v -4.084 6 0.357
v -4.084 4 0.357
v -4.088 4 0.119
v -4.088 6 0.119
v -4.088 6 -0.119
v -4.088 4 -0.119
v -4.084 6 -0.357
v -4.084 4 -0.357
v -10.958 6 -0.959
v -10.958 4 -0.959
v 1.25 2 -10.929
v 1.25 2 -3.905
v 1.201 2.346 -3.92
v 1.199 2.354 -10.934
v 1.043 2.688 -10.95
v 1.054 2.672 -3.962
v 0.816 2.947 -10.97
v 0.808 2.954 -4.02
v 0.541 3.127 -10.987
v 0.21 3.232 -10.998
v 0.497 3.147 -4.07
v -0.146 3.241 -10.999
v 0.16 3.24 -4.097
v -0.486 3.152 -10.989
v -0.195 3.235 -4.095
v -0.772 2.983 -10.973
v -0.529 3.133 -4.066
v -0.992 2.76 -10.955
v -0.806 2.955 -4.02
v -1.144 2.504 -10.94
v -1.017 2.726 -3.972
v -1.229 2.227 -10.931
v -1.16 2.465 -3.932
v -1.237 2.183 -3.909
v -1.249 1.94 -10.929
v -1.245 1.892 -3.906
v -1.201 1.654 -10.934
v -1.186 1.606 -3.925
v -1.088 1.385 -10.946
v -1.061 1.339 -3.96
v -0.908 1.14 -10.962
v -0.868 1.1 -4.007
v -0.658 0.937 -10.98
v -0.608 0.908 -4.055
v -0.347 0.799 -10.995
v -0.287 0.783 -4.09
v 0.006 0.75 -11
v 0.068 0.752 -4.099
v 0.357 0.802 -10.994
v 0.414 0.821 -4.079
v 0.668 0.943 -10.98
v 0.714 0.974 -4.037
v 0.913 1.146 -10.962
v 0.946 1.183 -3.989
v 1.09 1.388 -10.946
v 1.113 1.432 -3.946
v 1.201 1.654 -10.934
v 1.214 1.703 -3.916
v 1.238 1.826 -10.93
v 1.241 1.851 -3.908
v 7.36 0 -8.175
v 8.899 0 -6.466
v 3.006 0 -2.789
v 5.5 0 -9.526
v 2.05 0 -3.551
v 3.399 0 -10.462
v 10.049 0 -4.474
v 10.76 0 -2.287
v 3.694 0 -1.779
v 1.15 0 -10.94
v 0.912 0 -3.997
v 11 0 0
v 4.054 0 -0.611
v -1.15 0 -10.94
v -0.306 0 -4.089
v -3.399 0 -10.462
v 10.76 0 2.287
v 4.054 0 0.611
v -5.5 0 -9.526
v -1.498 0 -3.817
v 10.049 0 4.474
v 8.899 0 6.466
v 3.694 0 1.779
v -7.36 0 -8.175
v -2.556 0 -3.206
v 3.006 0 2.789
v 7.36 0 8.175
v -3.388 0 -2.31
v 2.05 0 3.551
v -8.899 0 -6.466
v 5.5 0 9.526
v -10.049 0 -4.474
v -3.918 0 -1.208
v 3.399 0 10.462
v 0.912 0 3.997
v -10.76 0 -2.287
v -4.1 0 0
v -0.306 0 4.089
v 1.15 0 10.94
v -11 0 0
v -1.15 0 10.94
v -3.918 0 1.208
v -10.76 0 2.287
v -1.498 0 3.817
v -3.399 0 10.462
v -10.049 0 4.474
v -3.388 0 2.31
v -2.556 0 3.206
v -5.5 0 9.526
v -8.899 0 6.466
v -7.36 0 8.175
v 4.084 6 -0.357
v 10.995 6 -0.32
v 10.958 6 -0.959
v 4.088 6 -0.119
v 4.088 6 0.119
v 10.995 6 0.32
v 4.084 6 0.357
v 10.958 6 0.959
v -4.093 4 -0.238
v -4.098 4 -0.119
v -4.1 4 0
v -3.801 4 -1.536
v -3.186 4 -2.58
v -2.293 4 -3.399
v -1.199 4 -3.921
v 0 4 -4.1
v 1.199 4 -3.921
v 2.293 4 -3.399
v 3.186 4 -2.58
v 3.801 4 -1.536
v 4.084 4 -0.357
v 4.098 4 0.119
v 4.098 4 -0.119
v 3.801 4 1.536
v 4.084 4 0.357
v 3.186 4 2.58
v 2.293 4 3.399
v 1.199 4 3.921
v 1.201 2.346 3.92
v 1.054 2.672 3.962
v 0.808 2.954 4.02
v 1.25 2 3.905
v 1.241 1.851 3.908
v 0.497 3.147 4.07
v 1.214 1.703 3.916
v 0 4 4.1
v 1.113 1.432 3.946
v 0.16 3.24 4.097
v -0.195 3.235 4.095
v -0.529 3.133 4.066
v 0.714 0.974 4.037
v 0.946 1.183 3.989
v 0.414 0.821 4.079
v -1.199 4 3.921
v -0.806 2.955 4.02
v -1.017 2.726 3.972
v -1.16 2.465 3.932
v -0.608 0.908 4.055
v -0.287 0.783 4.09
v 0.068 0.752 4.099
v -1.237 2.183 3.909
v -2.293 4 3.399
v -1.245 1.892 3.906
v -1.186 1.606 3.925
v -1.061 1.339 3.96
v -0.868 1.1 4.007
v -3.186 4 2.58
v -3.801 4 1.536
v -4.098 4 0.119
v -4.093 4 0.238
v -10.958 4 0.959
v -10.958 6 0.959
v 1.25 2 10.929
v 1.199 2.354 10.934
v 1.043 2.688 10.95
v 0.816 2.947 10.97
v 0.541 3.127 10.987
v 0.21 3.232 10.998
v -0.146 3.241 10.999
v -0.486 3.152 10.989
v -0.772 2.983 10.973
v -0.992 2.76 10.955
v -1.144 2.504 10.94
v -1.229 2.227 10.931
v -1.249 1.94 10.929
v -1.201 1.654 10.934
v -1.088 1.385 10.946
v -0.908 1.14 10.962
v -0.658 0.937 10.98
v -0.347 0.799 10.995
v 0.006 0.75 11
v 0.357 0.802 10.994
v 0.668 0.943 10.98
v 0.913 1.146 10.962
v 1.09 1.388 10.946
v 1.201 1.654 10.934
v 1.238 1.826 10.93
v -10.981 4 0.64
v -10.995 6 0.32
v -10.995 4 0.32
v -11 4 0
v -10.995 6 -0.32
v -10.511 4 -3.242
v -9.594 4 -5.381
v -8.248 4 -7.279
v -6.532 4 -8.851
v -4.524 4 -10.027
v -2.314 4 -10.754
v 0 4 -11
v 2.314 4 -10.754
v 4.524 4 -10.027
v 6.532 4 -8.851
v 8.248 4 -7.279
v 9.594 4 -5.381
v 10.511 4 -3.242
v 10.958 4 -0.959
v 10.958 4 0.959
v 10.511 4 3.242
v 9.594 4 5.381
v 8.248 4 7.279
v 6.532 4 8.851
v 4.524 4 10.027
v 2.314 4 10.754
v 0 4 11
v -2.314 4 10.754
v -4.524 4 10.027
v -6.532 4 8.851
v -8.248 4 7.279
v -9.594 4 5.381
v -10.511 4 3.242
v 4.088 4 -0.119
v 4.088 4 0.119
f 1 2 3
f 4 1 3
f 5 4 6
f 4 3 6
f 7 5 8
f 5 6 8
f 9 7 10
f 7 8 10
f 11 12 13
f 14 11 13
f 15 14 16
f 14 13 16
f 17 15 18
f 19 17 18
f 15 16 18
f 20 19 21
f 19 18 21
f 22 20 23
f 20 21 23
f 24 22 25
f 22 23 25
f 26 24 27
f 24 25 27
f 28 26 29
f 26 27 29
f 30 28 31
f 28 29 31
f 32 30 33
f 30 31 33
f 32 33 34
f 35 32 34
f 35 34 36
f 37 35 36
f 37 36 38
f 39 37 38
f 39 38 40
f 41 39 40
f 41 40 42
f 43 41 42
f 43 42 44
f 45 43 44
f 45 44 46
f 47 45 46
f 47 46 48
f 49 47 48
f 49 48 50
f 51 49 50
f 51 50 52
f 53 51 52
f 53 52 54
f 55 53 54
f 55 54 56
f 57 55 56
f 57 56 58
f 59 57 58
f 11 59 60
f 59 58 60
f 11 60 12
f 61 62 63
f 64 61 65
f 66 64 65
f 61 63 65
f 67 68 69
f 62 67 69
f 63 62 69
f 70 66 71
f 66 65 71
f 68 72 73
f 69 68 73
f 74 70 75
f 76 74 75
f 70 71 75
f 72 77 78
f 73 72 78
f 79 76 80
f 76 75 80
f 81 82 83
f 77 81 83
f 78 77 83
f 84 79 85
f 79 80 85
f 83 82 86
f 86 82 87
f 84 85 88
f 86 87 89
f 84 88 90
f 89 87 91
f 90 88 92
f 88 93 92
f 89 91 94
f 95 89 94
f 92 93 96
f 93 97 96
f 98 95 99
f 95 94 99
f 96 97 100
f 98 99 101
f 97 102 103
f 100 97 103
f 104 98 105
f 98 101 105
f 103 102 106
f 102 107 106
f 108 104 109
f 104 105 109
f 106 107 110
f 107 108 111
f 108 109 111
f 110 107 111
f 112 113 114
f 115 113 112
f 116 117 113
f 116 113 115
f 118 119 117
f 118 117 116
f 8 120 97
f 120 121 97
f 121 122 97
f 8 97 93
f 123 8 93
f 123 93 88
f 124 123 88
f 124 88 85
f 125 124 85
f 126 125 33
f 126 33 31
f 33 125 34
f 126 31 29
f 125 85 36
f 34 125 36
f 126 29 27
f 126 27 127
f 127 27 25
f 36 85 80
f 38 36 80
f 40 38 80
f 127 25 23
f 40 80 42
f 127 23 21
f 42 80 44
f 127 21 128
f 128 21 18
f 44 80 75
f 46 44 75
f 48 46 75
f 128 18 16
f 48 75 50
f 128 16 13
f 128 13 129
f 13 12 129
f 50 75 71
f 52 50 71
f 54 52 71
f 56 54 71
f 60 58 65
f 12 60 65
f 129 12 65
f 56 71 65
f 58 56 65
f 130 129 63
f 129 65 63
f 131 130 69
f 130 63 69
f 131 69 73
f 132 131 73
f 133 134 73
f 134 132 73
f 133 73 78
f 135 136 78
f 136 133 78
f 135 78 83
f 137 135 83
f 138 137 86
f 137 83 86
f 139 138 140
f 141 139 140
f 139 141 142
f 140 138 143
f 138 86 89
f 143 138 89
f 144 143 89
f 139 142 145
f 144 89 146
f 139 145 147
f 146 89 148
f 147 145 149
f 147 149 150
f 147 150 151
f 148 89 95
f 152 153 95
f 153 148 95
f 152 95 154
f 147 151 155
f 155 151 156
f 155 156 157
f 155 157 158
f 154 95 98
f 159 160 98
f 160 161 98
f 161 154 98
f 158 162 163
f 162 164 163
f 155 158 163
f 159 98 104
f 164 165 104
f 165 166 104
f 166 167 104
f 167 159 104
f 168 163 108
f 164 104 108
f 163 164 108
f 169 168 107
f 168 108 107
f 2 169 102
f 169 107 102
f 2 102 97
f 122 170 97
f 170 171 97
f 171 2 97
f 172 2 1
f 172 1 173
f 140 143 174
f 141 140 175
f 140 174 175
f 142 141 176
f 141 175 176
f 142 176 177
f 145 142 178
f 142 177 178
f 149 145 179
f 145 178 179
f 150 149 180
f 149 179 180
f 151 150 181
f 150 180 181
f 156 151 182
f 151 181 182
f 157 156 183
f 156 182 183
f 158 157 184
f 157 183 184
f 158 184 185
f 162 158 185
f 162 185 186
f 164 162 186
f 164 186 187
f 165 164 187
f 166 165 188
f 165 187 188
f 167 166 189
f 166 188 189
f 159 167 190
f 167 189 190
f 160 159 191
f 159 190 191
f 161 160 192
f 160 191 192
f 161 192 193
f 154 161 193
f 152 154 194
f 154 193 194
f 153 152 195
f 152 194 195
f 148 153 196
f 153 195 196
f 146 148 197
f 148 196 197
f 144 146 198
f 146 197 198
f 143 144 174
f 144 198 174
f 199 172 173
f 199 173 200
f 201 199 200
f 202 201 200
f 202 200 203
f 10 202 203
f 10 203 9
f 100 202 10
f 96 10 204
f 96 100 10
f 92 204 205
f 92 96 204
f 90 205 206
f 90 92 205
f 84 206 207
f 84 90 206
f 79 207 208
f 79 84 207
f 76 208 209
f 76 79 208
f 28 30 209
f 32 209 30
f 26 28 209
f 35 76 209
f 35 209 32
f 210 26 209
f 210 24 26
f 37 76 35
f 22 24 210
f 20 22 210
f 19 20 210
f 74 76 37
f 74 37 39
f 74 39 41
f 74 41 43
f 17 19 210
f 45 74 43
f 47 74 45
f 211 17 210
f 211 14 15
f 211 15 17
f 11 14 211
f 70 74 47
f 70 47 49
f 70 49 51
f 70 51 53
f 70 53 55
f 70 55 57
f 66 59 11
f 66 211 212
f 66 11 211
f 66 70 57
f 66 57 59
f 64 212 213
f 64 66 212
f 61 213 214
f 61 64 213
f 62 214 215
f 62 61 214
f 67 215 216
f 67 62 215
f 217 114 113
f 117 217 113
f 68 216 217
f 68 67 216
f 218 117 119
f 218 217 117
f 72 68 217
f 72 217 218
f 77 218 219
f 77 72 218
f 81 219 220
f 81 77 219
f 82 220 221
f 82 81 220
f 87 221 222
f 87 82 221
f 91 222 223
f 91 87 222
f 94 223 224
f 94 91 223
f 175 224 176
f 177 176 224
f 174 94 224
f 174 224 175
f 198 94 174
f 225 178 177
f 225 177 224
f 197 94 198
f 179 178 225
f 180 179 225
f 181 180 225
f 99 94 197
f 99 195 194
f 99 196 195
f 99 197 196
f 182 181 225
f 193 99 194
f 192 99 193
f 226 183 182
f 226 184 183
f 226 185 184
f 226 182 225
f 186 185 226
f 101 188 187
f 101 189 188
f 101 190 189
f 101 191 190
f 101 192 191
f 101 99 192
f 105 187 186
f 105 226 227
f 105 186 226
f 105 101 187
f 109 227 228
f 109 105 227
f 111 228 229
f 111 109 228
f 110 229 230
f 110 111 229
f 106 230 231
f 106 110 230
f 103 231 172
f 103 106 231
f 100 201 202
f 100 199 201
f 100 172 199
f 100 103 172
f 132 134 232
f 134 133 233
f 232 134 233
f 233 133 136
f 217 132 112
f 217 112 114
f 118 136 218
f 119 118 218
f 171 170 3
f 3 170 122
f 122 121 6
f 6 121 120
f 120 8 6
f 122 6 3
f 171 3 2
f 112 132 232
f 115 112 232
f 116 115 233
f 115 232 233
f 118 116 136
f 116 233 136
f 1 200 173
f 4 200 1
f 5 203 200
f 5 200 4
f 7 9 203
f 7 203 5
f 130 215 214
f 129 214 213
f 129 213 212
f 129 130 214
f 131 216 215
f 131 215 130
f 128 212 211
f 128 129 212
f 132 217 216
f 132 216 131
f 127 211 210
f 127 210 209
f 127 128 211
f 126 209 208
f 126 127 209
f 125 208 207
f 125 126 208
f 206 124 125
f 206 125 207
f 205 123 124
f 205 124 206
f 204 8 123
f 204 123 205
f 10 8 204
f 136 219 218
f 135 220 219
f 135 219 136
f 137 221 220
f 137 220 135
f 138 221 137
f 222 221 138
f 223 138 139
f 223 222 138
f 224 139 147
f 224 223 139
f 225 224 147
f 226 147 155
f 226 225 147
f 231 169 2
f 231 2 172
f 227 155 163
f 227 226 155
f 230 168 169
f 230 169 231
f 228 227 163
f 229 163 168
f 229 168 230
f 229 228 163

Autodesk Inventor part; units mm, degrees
ref_plane "YZ Plane" through (0, 0, 0) normal (1, 0, 0) x (0, 1, 0)
ref_plane "XZ Plane" through (0, 0, 0) normal (0, 1, 0) x (-1, 0, 0)
ref_plane "XY Plane" through (0, 0, 0) normal (0, 0, 1) x (1, 0, 0)
sketch "Sketch1" plane through (0, 0, 0) normal (0, 1, 0) x (-1, 0, 0)
  circle A0 centre (0, 0) radius 4.1
  circle A1 centre (0, 0) radius 11
  dimension "d0" = 8.2
  dimension "d1" = 22
extrude "Extrusion1" add sketch "Sketch1" along normal blind 4
sketch "Sketch2" plane through (0, 4, 0) normal (0, 1, 0) x (1, 0, 0)
  line L0 (0, 0) -> (-8.1688, -0.7147) construction
  line L1 (0, 0) -> (-8.1688, 0.7147) construction
  arc A0 (-4.0844, 0.3573) -> (-4.0844, -0.3573) centre (10.5368, 0) ccw
  line L2 (-4.0844, 0.3573) -> (-10.9581, 0.9587)
  line L3 (-15.4, 0) -> (15.4, 0) construction
  circle A1 centre (0, 0) radius 4.1 construction
  circle A2 centre (0, 0) radius 11 construction
  line L4 (-4.0844, -0.3573) -> (-10.9581, -0.9587)
  circle A3 centre (0, 0) radius 11 projected
  dimension "d4" = 10
extrude "Extrusion2" add sketch "Sketch2" along normal blind 2 contours A0 L4 A3 L2 picked at (-8.693, 0.0397)
sketch "Sketch3" plane through (0, 0, 0) normal (0, 0, 1) x (1, 0, 0)
  circle A0 centre (0, 2) radius 1.25
  line L0 (11, 0) -> (-11, 0) projected
  point P0 (0, 0)
  dimension "d7" = 2.5
  dimension "d8" = 2
extrude "Extrusion3" cut sketch "Sketch3" against normal through all both and the other way through all
pattern_circular "Circular Pattern1" count 2 over 360 about axis through (0, -10, 0) along (0, 1, 0) of "Extrusion2"
properties part number "170d_coupler"
